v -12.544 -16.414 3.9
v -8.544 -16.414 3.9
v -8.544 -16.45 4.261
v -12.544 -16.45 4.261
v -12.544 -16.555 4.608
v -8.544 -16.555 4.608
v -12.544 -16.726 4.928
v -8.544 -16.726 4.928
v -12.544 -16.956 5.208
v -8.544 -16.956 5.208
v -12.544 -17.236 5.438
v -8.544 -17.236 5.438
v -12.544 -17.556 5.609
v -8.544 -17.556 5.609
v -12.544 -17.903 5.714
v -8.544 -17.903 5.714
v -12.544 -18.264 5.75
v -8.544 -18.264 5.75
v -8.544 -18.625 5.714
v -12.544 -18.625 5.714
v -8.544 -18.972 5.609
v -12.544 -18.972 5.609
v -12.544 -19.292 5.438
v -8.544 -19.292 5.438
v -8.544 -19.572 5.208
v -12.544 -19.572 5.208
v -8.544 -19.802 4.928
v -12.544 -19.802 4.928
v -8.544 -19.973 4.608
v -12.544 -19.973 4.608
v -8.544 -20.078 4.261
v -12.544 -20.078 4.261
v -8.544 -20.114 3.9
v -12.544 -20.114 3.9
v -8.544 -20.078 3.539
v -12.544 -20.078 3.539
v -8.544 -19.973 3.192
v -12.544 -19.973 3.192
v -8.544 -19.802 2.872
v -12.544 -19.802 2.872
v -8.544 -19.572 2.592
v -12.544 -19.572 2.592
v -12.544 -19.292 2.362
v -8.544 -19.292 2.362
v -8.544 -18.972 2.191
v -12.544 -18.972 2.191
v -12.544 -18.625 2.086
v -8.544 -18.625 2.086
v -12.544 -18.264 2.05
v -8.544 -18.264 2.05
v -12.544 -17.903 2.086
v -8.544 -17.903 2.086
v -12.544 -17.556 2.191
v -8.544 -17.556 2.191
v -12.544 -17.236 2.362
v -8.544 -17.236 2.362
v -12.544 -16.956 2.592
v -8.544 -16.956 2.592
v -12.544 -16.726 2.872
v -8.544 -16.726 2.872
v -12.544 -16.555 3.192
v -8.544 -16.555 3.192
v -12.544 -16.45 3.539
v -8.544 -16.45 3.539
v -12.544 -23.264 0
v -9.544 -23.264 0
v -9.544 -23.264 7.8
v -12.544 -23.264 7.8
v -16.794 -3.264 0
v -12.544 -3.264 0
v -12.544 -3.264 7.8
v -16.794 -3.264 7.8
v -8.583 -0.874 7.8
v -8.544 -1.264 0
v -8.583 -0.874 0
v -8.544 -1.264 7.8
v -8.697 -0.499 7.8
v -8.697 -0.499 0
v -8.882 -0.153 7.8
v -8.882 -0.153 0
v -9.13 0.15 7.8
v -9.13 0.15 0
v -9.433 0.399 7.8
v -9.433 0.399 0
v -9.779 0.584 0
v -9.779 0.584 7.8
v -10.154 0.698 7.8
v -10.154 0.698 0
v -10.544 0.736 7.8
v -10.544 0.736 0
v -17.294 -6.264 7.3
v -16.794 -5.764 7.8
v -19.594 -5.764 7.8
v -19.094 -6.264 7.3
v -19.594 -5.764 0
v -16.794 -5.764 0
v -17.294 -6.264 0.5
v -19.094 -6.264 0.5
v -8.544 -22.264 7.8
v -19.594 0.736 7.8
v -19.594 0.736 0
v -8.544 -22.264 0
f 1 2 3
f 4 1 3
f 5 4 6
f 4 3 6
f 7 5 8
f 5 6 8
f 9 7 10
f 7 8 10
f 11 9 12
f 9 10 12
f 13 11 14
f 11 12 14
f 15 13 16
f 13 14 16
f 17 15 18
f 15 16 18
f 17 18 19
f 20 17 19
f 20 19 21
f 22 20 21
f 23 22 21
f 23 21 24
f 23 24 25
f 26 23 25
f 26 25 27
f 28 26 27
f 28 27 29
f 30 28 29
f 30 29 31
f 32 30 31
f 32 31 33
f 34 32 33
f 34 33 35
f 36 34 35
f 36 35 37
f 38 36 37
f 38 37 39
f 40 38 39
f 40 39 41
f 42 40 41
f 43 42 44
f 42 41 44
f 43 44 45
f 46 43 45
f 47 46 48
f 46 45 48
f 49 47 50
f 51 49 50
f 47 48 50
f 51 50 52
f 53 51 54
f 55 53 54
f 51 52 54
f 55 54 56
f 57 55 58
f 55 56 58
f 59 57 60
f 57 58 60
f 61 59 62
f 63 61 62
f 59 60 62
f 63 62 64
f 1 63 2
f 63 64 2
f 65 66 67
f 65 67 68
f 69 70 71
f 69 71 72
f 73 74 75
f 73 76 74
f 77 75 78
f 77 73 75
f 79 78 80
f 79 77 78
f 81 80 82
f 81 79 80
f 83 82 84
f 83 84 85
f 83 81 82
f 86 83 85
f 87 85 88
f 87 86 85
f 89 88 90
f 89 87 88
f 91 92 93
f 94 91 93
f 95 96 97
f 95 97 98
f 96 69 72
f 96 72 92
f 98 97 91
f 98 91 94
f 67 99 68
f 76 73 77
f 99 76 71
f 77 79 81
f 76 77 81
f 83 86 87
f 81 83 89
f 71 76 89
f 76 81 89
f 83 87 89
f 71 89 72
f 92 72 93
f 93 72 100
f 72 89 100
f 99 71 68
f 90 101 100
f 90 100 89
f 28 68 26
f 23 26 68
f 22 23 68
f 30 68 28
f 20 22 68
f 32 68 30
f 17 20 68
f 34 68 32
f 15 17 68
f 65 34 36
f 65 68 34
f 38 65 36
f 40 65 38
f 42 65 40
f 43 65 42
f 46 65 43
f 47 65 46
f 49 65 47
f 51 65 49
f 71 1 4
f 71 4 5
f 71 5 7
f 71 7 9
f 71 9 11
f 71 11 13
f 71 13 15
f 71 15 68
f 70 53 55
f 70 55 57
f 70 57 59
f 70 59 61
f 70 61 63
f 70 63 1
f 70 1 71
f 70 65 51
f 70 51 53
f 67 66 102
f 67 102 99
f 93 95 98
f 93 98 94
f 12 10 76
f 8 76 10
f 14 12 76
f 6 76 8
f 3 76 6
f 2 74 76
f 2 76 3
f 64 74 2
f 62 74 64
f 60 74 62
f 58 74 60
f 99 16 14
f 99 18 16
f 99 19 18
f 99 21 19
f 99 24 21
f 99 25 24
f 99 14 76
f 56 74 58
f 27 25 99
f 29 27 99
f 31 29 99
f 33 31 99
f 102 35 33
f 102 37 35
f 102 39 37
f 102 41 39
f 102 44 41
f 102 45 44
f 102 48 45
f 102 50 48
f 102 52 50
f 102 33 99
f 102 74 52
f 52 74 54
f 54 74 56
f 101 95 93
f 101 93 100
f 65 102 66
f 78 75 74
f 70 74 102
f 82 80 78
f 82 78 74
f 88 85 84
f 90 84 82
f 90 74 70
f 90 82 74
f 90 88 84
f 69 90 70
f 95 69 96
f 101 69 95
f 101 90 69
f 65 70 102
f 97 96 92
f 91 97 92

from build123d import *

# Parameters (mm, degrees)
PAD_DEPTH       = 7.8
SKETCH001_R     = 1.85
POCKET_DEPTH    = 5
CHAMFER_SIZE    = 0.5
CHAMFER001_SIZE = 1
FILLET_R        = 2


with BuildPart() as part:
    # Sketch → Pad (new body)
    with BuildSketch(Plane.XY):
        Polygon((-16.794462, -6.264032), (-19.594462, -6.264032), (-19.594462, 0.735968), (-8.544462, 0.735968), (-8.544462, -23.264032), (-12.544462, -23.264032), (-12.544462, -3.264032), (-16.794462, -3.264032), align=None)
    extrude(amount=PAD_DEPTH)

    # Sketch001 (on Face4 of Pad) → Pocket (cut)
    with BuildSketch(Plane.YZ.offset(-8.544462)):
        with Locations((-18.264032, 3.9)):
            Circle(SKETCH001_R)
    extrude(amount=-POCKET_DEPTH, mode=Mode.SUBTRACT)

    # Chamfer
    chamfer_edges = [part.edges().sort_by_distance(p)[0] for p in [
        (-16.794462, -6.264032, 3.9),
        (-18.194462, -6.264032, 0),
        (-19.594462, -6.264032, 3.9),
        (-18.194462, -6.264032, 7.8),
    ]]
    chamfer(chamfer_edges, length=CHAMFER_SIZE)

    # Chamfer001
    chamfer001_edges = [part.edges().sort_by_distance(p)[0] for p in [
        (-8.544462, -23.264032, 3.9),
    ]]
    chamfer(chamfer001_edges, length=CHAMFER001_SIZE)

    # Fillet
    fillet_edges = [part.edges().sort_by_distance(p)[0] for p in [
        (-8.544462, 0.735968, 3.9),
    ]]
    fillet(fillet_edges, radius=FILLET_R)


solid = part.part
